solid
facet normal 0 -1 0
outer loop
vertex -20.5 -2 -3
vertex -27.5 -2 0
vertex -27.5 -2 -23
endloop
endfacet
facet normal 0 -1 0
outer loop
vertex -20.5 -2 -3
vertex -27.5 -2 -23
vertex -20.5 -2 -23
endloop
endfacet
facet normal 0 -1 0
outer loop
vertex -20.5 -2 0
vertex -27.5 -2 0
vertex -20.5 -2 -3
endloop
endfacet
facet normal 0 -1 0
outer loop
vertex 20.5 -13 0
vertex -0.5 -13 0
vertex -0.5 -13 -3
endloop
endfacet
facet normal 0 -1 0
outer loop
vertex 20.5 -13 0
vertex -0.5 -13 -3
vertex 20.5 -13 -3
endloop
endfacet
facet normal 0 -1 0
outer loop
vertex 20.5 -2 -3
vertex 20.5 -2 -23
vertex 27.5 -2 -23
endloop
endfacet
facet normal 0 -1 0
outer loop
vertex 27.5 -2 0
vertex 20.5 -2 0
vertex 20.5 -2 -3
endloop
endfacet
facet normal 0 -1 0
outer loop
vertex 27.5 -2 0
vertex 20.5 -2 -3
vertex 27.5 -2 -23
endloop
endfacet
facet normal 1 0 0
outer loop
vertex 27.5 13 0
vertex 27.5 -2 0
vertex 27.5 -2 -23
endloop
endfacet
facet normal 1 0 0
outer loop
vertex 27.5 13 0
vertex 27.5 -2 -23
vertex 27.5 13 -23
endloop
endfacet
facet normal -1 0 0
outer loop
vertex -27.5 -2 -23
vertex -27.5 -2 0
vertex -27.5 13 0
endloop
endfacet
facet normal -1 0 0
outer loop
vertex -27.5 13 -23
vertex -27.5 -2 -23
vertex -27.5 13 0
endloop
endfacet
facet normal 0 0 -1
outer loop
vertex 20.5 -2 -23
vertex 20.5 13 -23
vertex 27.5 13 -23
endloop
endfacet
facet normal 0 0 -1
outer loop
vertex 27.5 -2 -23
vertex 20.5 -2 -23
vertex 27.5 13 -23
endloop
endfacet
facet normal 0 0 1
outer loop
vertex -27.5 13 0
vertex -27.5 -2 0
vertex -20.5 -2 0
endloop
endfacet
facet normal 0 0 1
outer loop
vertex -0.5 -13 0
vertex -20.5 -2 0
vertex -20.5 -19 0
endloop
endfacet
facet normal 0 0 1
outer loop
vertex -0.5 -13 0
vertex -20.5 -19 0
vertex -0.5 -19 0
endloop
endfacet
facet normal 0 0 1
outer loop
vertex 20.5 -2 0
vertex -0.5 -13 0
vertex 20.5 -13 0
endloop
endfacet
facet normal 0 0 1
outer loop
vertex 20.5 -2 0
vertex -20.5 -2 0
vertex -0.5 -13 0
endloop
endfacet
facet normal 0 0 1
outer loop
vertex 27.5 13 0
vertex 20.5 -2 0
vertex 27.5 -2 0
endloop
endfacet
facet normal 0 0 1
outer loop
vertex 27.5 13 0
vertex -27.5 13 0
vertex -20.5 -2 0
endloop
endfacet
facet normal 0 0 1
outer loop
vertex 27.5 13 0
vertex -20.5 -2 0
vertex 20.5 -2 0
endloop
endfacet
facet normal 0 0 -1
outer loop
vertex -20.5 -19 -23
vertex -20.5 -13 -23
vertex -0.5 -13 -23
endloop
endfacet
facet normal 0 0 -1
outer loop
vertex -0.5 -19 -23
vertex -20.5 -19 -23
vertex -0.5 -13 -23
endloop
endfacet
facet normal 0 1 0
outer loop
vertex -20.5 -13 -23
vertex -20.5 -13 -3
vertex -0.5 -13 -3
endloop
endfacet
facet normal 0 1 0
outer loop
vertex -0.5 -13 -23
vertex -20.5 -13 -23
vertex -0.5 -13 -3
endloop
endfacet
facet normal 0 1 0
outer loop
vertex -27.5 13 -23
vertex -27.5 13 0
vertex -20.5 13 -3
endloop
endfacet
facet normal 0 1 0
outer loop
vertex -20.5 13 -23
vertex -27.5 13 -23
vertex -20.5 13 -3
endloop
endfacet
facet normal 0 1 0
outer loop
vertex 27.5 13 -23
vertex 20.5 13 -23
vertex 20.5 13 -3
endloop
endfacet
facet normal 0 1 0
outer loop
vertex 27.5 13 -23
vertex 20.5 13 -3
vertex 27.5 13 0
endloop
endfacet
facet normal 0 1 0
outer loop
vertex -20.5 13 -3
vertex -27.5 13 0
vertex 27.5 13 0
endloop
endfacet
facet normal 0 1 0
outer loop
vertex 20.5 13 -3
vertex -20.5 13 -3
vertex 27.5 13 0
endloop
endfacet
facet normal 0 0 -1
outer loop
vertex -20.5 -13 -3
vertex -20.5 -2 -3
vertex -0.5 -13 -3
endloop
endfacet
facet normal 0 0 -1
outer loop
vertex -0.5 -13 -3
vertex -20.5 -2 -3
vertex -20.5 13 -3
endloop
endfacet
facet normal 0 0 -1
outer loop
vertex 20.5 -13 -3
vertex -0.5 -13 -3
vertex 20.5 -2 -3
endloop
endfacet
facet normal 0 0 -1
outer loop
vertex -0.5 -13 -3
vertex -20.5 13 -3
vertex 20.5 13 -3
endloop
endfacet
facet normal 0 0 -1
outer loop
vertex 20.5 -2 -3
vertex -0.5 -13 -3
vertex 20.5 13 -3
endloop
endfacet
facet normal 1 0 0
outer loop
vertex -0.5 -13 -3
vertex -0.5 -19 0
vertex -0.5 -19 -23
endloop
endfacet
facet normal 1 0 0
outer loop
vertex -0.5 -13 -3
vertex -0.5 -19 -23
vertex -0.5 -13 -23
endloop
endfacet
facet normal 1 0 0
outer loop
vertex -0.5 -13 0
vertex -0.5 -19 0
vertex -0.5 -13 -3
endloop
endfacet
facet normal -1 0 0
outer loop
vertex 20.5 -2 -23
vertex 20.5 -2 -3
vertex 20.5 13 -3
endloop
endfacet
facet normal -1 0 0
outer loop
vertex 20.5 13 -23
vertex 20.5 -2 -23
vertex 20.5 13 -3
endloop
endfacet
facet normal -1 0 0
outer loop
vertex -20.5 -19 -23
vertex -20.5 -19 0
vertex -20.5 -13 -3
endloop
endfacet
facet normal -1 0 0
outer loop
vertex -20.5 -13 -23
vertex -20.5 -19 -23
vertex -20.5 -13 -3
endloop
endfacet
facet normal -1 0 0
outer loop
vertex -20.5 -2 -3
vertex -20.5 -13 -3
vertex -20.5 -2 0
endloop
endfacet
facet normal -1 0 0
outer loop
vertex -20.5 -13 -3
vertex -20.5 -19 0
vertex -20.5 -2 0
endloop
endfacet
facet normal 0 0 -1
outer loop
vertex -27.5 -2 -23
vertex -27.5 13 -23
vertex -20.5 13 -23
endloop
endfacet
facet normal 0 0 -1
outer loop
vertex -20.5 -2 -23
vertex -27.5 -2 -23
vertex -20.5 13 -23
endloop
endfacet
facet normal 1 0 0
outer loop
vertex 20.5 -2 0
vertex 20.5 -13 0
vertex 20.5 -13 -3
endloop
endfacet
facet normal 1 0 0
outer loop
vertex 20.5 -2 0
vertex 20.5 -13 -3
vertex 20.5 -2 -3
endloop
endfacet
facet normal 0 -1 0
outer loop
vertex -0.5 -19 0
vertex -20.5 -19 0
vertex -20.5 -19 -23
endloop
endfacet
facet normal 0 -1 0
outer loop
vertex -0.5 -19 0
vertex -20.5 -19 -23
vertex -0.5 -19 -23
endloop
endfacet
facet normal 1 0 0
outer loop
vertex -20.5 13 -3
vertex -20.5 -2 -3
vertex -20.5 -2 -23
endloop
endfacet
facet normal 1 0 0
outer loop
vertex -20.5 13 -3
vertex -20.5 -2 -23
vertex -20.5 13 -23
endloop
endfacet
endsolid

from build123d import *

# Parameters (mm, degrees)
SKETCH1_W           = 41
SKETCH1_H           = 26
BOSS_EXTRUDE1_DEPTH = 3
SKETCH1_3_W         = 20
SKETCH1_3_H         = 6
SKETCH1_3_W_2       = 7
SKETCH1_3_H_2       = 15
BOSS_EXTRUDE2_DEPTH = 23


with BuildPart() as part:
    # Sketch1 → Boss-Extrude1 (new body)
    with BuildSketch(Plane.XY):
        Rectangle(SKETCH1_W, SKETCH1_H)
    extrude(amount=-BOSS_EXTRUDE1_DEPTH)

    # Sketch1<3> → Boss-Extrude2 (add)
    with BuildSketch(Plane.XY):
        with Locations((-10.5, -16)):
            Rectangle(SKETCH1_3_W, SKETCH1_3_H)
        with Locations((-24, 5.5)):
            Rectangle(SKETCH1_3_W_2, SKETCH1_3_H_2)
        with Locations((24, 5.5)):
            Rectangle(SKETCH1_3_W_2, SKETCH1_3_H_2)
    extrude(amount=-BOSS_EXTRUDE2_DEPTH)


solid = part.part
